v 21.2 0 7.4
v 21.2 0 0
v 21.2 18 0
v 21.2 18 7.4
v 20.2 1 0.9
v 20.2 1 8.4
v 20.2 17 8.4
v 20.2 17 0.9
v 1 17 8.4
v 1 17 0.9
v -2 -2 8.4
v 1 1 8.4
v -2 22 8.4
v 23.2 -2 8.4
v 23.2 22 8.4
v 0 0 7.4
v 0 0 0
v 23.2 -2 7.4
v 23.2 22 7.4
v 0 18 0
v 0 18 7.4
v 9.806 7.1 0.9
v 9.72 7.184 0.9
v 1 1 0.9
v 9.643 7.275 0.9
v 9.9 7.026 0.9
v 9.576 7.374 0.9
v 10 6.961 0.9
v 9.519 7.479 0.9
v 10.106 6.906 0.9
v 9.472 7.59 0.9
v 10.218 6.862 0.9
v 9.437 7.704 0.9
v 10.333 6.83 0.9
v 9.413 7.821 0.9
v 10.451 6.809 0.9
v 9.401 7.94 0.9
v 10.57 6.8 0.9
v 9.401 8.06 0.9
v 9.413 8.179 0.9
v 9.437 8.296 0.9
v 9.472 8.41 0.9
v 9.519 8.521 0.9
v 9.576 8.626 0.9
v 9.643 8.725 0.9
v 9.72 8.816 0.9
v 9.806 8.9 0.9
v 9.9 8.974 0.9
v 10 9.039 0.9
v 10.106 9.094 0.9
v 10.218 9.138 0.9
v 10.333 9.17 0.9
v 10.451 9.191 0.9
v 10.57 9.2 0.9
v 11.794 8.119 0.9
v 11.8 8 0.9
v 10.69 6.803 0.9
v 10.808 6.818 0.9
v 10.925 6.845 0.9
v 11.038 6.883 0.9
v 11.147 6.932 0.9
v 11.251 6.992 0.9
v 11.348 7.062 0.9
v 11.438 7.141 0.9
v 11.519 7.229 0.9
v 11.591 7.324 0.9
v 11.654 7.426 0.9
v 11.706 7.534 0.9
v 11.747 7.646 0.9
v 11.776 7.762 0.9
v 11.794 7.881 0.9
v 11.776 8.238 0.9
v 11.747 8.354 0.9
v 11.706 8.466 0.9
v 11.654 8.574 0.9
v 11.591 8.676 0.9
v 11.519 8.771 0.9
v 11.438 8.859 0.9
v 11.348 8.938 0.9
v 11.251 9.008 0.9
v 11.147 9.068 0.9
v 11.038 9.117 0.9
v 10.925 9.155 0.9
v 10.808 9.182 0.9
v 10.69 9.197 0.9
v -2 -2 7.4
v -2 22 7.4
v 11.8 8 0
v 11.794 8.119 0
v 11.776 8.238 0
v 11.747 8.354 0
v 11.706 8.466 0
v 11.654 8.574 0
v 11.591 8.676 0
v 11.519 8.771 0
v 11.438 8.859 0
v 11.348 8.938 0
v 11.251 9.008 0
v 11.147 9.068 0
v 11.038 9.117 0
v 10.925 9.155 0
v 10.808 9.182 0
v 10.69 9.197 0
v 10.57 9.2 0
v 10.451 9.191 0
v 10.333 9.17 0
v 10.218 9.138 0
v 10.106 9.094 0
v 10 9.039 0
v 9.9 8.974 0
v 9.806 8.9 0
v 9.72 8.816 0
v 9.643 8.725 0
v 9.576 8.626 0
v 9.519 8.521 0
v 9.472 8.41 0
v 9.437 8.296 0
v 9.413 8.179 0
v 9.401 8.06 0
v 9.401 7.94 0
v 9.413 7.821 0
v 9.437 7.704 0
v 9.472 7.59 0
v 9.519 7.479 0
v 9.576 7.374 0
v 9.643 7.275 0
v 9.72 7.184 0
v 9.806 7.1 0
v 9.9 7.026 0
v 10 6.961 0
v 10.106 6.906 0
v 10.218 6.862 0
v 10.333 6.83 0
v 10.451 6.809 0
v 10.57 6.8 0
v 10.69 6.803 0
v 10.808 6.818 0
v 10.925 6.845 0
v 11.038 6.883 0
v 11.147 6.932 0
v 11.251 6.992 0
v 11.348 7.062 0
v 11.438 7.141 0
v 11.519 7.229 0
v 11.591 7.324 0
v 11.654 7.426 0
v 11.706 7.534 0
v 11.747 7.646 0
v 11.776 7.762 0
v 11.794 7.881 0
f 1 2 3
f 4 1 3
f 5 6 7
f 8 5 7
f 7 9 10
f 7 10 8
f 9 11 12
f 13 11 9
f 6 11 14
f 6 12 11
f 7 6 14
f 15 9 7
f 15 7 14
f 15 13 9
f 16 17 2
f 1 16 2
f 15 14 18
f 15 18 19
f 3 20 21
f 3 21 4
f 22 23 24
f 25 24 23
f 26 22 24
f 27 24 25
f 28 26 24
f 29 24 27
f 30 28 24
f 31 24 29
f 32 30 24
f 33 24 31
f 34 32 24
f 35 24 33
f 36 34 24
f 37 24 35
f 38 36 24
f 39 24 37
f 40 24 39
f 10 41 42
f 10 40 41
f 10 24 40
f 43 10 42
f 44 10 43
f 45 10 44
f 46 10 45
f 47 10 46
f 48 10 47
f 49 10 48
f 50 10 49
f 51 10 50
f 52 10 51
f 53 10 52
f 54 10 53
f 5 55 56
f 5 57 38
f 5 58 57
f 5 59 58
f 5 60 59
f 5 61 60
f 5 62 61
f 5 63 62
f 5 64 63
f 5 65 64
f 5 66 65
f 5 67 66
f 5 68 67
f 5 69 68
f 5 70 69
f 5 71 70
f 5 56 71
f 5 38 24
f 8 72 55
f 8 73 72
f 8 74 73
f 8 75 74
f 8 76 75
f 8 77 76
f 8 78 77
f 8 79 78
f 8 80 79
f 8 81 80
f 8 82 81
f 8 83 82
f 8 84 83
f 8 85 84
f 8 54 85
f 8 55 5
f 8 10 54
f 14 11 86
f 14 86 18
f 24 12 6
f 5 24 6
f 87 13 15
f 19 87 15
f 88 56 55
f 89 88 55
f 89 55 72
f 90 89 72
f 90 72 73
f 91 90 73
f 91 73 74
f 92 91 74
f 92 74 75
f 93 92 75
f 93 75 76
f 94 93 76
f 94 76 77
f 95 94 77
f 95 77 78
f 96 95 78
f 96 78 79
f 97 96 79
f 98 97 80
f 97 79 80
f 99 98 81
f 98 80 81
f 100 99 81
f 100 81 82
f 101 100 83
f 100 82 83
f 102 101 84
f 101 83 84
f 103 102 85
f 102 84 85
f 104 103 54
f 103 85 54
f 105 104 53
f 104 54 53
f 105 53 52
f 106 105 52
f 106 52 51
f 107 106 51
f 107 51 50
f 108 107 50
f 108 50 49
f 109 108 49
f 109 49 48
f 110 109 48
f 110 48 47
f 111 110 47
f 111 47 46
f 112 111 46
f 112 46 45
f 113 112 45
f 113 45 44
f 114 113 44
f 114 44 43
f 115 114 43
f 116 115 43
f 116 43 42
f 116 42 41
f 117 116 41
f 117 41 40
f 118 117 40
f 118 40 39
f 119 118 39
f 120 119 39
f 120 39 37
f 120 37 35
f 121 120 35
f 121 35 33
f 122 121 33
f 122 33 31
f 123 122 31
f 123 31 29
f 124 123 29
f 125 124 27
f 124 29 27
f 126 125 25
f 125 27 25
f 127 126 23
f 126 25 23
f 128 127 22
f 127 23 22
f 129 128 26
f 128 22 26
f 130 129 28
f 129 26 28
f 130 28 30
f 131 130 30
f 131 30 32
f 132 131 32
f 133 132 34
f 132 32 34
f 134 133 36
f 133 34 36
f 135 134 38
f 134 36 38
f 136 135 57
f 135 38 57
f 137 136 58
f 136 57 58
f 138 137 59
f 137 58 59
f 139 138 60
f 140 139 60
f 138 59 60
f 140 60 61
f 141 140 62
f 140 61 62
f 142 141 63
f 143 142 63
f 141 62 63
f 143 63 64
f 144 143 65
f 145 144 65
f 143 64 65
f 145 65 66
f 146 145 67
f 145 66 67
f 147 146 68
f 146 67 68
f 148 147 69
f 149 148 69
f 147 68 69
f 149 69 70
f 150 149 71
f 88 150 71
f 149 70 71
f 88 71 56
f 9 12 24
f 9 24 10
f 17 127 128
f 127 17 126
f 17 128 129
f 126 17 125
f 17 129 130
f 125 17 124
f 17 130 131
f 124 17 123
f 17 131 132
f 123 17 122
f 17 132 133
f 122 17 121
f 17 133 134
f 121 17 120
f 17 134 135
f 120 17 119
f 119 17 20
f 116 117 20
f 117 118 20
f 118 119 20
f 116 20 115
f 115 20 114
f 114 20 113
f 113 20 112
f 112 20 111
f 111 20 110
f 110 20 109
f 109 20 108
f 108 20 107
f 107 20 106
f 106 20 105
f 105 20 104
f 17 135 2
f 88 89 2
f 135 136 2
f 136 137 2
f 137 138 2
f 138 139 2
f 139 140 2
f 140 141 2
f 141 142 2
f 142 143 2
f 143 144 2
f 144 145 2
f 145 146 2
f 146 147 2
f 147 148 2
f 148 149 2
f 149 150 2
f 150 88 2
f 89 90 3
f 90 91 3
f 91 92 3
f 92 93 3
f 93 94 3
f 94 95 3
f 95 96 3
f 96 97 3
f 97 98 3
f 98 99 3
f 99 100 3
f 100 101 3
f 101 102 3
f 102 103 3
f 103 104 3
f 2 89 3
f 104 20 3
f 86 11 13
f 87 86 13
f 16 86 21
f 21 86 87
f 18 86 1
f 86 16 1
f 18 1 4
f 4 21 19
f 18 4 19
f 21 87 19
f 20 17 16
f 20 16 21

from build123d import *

# Parameters (mm, degrees)
F0_W     = 21.2
F0_H     = 18
F1_DEPTH = 8.4
F2_W     = 19.2
F2_H     = 16
F3_DEPTH = 7.5
F4_W     = 25.2
F4_H     = 24
F4_W_2   = 21.2
F4_H_2   = 18
F5_DEPTH = 1
F6_R     = 1.2
F7_DEPTH = 0.901


with BuildPart() as f1:
    # F0 (on Top) → F1 (new body)
    with BuildSketch(Plane.XY):
        with Locations((10.6, 9)):
            Rectangle(F0_W, F0_H)
    extrude(amount=F1_DEPTH)

    # F2 (on face) → F3 (cut)
    with BuildSketch(Plane.XY.offset(8.4)):
        with Locations((10.6, 9)):
            Rectangle(F2_W, F2_H)
    extrude(amount=-F3_DEPTH, mode=Mode.SUBTRACT)

    # F4 (on face) → F5 (join)
    with BuildSketch(Plane.XY.offset(8.4)):
        with Locations((10.6, 10)):
            Rectangle(F4_W, F4_H)
        with Locations((10.6, 9)):
            Rectangle(F4_W_2, F4_H_2, mode=Mode.SUBTRACT)
    extrude(amount=-F5_DEPTH)

    # F6 (on face) → F7 (cut, through all)
    with BuildSketch(Plane.XY.offset(0.9)):
        with Locations((10.6, 8)):
            Circle(F6_R)
    extrude(amount=-F7_DEPTH, mode=Mode.SUBTRACT)


solid = f1.part
